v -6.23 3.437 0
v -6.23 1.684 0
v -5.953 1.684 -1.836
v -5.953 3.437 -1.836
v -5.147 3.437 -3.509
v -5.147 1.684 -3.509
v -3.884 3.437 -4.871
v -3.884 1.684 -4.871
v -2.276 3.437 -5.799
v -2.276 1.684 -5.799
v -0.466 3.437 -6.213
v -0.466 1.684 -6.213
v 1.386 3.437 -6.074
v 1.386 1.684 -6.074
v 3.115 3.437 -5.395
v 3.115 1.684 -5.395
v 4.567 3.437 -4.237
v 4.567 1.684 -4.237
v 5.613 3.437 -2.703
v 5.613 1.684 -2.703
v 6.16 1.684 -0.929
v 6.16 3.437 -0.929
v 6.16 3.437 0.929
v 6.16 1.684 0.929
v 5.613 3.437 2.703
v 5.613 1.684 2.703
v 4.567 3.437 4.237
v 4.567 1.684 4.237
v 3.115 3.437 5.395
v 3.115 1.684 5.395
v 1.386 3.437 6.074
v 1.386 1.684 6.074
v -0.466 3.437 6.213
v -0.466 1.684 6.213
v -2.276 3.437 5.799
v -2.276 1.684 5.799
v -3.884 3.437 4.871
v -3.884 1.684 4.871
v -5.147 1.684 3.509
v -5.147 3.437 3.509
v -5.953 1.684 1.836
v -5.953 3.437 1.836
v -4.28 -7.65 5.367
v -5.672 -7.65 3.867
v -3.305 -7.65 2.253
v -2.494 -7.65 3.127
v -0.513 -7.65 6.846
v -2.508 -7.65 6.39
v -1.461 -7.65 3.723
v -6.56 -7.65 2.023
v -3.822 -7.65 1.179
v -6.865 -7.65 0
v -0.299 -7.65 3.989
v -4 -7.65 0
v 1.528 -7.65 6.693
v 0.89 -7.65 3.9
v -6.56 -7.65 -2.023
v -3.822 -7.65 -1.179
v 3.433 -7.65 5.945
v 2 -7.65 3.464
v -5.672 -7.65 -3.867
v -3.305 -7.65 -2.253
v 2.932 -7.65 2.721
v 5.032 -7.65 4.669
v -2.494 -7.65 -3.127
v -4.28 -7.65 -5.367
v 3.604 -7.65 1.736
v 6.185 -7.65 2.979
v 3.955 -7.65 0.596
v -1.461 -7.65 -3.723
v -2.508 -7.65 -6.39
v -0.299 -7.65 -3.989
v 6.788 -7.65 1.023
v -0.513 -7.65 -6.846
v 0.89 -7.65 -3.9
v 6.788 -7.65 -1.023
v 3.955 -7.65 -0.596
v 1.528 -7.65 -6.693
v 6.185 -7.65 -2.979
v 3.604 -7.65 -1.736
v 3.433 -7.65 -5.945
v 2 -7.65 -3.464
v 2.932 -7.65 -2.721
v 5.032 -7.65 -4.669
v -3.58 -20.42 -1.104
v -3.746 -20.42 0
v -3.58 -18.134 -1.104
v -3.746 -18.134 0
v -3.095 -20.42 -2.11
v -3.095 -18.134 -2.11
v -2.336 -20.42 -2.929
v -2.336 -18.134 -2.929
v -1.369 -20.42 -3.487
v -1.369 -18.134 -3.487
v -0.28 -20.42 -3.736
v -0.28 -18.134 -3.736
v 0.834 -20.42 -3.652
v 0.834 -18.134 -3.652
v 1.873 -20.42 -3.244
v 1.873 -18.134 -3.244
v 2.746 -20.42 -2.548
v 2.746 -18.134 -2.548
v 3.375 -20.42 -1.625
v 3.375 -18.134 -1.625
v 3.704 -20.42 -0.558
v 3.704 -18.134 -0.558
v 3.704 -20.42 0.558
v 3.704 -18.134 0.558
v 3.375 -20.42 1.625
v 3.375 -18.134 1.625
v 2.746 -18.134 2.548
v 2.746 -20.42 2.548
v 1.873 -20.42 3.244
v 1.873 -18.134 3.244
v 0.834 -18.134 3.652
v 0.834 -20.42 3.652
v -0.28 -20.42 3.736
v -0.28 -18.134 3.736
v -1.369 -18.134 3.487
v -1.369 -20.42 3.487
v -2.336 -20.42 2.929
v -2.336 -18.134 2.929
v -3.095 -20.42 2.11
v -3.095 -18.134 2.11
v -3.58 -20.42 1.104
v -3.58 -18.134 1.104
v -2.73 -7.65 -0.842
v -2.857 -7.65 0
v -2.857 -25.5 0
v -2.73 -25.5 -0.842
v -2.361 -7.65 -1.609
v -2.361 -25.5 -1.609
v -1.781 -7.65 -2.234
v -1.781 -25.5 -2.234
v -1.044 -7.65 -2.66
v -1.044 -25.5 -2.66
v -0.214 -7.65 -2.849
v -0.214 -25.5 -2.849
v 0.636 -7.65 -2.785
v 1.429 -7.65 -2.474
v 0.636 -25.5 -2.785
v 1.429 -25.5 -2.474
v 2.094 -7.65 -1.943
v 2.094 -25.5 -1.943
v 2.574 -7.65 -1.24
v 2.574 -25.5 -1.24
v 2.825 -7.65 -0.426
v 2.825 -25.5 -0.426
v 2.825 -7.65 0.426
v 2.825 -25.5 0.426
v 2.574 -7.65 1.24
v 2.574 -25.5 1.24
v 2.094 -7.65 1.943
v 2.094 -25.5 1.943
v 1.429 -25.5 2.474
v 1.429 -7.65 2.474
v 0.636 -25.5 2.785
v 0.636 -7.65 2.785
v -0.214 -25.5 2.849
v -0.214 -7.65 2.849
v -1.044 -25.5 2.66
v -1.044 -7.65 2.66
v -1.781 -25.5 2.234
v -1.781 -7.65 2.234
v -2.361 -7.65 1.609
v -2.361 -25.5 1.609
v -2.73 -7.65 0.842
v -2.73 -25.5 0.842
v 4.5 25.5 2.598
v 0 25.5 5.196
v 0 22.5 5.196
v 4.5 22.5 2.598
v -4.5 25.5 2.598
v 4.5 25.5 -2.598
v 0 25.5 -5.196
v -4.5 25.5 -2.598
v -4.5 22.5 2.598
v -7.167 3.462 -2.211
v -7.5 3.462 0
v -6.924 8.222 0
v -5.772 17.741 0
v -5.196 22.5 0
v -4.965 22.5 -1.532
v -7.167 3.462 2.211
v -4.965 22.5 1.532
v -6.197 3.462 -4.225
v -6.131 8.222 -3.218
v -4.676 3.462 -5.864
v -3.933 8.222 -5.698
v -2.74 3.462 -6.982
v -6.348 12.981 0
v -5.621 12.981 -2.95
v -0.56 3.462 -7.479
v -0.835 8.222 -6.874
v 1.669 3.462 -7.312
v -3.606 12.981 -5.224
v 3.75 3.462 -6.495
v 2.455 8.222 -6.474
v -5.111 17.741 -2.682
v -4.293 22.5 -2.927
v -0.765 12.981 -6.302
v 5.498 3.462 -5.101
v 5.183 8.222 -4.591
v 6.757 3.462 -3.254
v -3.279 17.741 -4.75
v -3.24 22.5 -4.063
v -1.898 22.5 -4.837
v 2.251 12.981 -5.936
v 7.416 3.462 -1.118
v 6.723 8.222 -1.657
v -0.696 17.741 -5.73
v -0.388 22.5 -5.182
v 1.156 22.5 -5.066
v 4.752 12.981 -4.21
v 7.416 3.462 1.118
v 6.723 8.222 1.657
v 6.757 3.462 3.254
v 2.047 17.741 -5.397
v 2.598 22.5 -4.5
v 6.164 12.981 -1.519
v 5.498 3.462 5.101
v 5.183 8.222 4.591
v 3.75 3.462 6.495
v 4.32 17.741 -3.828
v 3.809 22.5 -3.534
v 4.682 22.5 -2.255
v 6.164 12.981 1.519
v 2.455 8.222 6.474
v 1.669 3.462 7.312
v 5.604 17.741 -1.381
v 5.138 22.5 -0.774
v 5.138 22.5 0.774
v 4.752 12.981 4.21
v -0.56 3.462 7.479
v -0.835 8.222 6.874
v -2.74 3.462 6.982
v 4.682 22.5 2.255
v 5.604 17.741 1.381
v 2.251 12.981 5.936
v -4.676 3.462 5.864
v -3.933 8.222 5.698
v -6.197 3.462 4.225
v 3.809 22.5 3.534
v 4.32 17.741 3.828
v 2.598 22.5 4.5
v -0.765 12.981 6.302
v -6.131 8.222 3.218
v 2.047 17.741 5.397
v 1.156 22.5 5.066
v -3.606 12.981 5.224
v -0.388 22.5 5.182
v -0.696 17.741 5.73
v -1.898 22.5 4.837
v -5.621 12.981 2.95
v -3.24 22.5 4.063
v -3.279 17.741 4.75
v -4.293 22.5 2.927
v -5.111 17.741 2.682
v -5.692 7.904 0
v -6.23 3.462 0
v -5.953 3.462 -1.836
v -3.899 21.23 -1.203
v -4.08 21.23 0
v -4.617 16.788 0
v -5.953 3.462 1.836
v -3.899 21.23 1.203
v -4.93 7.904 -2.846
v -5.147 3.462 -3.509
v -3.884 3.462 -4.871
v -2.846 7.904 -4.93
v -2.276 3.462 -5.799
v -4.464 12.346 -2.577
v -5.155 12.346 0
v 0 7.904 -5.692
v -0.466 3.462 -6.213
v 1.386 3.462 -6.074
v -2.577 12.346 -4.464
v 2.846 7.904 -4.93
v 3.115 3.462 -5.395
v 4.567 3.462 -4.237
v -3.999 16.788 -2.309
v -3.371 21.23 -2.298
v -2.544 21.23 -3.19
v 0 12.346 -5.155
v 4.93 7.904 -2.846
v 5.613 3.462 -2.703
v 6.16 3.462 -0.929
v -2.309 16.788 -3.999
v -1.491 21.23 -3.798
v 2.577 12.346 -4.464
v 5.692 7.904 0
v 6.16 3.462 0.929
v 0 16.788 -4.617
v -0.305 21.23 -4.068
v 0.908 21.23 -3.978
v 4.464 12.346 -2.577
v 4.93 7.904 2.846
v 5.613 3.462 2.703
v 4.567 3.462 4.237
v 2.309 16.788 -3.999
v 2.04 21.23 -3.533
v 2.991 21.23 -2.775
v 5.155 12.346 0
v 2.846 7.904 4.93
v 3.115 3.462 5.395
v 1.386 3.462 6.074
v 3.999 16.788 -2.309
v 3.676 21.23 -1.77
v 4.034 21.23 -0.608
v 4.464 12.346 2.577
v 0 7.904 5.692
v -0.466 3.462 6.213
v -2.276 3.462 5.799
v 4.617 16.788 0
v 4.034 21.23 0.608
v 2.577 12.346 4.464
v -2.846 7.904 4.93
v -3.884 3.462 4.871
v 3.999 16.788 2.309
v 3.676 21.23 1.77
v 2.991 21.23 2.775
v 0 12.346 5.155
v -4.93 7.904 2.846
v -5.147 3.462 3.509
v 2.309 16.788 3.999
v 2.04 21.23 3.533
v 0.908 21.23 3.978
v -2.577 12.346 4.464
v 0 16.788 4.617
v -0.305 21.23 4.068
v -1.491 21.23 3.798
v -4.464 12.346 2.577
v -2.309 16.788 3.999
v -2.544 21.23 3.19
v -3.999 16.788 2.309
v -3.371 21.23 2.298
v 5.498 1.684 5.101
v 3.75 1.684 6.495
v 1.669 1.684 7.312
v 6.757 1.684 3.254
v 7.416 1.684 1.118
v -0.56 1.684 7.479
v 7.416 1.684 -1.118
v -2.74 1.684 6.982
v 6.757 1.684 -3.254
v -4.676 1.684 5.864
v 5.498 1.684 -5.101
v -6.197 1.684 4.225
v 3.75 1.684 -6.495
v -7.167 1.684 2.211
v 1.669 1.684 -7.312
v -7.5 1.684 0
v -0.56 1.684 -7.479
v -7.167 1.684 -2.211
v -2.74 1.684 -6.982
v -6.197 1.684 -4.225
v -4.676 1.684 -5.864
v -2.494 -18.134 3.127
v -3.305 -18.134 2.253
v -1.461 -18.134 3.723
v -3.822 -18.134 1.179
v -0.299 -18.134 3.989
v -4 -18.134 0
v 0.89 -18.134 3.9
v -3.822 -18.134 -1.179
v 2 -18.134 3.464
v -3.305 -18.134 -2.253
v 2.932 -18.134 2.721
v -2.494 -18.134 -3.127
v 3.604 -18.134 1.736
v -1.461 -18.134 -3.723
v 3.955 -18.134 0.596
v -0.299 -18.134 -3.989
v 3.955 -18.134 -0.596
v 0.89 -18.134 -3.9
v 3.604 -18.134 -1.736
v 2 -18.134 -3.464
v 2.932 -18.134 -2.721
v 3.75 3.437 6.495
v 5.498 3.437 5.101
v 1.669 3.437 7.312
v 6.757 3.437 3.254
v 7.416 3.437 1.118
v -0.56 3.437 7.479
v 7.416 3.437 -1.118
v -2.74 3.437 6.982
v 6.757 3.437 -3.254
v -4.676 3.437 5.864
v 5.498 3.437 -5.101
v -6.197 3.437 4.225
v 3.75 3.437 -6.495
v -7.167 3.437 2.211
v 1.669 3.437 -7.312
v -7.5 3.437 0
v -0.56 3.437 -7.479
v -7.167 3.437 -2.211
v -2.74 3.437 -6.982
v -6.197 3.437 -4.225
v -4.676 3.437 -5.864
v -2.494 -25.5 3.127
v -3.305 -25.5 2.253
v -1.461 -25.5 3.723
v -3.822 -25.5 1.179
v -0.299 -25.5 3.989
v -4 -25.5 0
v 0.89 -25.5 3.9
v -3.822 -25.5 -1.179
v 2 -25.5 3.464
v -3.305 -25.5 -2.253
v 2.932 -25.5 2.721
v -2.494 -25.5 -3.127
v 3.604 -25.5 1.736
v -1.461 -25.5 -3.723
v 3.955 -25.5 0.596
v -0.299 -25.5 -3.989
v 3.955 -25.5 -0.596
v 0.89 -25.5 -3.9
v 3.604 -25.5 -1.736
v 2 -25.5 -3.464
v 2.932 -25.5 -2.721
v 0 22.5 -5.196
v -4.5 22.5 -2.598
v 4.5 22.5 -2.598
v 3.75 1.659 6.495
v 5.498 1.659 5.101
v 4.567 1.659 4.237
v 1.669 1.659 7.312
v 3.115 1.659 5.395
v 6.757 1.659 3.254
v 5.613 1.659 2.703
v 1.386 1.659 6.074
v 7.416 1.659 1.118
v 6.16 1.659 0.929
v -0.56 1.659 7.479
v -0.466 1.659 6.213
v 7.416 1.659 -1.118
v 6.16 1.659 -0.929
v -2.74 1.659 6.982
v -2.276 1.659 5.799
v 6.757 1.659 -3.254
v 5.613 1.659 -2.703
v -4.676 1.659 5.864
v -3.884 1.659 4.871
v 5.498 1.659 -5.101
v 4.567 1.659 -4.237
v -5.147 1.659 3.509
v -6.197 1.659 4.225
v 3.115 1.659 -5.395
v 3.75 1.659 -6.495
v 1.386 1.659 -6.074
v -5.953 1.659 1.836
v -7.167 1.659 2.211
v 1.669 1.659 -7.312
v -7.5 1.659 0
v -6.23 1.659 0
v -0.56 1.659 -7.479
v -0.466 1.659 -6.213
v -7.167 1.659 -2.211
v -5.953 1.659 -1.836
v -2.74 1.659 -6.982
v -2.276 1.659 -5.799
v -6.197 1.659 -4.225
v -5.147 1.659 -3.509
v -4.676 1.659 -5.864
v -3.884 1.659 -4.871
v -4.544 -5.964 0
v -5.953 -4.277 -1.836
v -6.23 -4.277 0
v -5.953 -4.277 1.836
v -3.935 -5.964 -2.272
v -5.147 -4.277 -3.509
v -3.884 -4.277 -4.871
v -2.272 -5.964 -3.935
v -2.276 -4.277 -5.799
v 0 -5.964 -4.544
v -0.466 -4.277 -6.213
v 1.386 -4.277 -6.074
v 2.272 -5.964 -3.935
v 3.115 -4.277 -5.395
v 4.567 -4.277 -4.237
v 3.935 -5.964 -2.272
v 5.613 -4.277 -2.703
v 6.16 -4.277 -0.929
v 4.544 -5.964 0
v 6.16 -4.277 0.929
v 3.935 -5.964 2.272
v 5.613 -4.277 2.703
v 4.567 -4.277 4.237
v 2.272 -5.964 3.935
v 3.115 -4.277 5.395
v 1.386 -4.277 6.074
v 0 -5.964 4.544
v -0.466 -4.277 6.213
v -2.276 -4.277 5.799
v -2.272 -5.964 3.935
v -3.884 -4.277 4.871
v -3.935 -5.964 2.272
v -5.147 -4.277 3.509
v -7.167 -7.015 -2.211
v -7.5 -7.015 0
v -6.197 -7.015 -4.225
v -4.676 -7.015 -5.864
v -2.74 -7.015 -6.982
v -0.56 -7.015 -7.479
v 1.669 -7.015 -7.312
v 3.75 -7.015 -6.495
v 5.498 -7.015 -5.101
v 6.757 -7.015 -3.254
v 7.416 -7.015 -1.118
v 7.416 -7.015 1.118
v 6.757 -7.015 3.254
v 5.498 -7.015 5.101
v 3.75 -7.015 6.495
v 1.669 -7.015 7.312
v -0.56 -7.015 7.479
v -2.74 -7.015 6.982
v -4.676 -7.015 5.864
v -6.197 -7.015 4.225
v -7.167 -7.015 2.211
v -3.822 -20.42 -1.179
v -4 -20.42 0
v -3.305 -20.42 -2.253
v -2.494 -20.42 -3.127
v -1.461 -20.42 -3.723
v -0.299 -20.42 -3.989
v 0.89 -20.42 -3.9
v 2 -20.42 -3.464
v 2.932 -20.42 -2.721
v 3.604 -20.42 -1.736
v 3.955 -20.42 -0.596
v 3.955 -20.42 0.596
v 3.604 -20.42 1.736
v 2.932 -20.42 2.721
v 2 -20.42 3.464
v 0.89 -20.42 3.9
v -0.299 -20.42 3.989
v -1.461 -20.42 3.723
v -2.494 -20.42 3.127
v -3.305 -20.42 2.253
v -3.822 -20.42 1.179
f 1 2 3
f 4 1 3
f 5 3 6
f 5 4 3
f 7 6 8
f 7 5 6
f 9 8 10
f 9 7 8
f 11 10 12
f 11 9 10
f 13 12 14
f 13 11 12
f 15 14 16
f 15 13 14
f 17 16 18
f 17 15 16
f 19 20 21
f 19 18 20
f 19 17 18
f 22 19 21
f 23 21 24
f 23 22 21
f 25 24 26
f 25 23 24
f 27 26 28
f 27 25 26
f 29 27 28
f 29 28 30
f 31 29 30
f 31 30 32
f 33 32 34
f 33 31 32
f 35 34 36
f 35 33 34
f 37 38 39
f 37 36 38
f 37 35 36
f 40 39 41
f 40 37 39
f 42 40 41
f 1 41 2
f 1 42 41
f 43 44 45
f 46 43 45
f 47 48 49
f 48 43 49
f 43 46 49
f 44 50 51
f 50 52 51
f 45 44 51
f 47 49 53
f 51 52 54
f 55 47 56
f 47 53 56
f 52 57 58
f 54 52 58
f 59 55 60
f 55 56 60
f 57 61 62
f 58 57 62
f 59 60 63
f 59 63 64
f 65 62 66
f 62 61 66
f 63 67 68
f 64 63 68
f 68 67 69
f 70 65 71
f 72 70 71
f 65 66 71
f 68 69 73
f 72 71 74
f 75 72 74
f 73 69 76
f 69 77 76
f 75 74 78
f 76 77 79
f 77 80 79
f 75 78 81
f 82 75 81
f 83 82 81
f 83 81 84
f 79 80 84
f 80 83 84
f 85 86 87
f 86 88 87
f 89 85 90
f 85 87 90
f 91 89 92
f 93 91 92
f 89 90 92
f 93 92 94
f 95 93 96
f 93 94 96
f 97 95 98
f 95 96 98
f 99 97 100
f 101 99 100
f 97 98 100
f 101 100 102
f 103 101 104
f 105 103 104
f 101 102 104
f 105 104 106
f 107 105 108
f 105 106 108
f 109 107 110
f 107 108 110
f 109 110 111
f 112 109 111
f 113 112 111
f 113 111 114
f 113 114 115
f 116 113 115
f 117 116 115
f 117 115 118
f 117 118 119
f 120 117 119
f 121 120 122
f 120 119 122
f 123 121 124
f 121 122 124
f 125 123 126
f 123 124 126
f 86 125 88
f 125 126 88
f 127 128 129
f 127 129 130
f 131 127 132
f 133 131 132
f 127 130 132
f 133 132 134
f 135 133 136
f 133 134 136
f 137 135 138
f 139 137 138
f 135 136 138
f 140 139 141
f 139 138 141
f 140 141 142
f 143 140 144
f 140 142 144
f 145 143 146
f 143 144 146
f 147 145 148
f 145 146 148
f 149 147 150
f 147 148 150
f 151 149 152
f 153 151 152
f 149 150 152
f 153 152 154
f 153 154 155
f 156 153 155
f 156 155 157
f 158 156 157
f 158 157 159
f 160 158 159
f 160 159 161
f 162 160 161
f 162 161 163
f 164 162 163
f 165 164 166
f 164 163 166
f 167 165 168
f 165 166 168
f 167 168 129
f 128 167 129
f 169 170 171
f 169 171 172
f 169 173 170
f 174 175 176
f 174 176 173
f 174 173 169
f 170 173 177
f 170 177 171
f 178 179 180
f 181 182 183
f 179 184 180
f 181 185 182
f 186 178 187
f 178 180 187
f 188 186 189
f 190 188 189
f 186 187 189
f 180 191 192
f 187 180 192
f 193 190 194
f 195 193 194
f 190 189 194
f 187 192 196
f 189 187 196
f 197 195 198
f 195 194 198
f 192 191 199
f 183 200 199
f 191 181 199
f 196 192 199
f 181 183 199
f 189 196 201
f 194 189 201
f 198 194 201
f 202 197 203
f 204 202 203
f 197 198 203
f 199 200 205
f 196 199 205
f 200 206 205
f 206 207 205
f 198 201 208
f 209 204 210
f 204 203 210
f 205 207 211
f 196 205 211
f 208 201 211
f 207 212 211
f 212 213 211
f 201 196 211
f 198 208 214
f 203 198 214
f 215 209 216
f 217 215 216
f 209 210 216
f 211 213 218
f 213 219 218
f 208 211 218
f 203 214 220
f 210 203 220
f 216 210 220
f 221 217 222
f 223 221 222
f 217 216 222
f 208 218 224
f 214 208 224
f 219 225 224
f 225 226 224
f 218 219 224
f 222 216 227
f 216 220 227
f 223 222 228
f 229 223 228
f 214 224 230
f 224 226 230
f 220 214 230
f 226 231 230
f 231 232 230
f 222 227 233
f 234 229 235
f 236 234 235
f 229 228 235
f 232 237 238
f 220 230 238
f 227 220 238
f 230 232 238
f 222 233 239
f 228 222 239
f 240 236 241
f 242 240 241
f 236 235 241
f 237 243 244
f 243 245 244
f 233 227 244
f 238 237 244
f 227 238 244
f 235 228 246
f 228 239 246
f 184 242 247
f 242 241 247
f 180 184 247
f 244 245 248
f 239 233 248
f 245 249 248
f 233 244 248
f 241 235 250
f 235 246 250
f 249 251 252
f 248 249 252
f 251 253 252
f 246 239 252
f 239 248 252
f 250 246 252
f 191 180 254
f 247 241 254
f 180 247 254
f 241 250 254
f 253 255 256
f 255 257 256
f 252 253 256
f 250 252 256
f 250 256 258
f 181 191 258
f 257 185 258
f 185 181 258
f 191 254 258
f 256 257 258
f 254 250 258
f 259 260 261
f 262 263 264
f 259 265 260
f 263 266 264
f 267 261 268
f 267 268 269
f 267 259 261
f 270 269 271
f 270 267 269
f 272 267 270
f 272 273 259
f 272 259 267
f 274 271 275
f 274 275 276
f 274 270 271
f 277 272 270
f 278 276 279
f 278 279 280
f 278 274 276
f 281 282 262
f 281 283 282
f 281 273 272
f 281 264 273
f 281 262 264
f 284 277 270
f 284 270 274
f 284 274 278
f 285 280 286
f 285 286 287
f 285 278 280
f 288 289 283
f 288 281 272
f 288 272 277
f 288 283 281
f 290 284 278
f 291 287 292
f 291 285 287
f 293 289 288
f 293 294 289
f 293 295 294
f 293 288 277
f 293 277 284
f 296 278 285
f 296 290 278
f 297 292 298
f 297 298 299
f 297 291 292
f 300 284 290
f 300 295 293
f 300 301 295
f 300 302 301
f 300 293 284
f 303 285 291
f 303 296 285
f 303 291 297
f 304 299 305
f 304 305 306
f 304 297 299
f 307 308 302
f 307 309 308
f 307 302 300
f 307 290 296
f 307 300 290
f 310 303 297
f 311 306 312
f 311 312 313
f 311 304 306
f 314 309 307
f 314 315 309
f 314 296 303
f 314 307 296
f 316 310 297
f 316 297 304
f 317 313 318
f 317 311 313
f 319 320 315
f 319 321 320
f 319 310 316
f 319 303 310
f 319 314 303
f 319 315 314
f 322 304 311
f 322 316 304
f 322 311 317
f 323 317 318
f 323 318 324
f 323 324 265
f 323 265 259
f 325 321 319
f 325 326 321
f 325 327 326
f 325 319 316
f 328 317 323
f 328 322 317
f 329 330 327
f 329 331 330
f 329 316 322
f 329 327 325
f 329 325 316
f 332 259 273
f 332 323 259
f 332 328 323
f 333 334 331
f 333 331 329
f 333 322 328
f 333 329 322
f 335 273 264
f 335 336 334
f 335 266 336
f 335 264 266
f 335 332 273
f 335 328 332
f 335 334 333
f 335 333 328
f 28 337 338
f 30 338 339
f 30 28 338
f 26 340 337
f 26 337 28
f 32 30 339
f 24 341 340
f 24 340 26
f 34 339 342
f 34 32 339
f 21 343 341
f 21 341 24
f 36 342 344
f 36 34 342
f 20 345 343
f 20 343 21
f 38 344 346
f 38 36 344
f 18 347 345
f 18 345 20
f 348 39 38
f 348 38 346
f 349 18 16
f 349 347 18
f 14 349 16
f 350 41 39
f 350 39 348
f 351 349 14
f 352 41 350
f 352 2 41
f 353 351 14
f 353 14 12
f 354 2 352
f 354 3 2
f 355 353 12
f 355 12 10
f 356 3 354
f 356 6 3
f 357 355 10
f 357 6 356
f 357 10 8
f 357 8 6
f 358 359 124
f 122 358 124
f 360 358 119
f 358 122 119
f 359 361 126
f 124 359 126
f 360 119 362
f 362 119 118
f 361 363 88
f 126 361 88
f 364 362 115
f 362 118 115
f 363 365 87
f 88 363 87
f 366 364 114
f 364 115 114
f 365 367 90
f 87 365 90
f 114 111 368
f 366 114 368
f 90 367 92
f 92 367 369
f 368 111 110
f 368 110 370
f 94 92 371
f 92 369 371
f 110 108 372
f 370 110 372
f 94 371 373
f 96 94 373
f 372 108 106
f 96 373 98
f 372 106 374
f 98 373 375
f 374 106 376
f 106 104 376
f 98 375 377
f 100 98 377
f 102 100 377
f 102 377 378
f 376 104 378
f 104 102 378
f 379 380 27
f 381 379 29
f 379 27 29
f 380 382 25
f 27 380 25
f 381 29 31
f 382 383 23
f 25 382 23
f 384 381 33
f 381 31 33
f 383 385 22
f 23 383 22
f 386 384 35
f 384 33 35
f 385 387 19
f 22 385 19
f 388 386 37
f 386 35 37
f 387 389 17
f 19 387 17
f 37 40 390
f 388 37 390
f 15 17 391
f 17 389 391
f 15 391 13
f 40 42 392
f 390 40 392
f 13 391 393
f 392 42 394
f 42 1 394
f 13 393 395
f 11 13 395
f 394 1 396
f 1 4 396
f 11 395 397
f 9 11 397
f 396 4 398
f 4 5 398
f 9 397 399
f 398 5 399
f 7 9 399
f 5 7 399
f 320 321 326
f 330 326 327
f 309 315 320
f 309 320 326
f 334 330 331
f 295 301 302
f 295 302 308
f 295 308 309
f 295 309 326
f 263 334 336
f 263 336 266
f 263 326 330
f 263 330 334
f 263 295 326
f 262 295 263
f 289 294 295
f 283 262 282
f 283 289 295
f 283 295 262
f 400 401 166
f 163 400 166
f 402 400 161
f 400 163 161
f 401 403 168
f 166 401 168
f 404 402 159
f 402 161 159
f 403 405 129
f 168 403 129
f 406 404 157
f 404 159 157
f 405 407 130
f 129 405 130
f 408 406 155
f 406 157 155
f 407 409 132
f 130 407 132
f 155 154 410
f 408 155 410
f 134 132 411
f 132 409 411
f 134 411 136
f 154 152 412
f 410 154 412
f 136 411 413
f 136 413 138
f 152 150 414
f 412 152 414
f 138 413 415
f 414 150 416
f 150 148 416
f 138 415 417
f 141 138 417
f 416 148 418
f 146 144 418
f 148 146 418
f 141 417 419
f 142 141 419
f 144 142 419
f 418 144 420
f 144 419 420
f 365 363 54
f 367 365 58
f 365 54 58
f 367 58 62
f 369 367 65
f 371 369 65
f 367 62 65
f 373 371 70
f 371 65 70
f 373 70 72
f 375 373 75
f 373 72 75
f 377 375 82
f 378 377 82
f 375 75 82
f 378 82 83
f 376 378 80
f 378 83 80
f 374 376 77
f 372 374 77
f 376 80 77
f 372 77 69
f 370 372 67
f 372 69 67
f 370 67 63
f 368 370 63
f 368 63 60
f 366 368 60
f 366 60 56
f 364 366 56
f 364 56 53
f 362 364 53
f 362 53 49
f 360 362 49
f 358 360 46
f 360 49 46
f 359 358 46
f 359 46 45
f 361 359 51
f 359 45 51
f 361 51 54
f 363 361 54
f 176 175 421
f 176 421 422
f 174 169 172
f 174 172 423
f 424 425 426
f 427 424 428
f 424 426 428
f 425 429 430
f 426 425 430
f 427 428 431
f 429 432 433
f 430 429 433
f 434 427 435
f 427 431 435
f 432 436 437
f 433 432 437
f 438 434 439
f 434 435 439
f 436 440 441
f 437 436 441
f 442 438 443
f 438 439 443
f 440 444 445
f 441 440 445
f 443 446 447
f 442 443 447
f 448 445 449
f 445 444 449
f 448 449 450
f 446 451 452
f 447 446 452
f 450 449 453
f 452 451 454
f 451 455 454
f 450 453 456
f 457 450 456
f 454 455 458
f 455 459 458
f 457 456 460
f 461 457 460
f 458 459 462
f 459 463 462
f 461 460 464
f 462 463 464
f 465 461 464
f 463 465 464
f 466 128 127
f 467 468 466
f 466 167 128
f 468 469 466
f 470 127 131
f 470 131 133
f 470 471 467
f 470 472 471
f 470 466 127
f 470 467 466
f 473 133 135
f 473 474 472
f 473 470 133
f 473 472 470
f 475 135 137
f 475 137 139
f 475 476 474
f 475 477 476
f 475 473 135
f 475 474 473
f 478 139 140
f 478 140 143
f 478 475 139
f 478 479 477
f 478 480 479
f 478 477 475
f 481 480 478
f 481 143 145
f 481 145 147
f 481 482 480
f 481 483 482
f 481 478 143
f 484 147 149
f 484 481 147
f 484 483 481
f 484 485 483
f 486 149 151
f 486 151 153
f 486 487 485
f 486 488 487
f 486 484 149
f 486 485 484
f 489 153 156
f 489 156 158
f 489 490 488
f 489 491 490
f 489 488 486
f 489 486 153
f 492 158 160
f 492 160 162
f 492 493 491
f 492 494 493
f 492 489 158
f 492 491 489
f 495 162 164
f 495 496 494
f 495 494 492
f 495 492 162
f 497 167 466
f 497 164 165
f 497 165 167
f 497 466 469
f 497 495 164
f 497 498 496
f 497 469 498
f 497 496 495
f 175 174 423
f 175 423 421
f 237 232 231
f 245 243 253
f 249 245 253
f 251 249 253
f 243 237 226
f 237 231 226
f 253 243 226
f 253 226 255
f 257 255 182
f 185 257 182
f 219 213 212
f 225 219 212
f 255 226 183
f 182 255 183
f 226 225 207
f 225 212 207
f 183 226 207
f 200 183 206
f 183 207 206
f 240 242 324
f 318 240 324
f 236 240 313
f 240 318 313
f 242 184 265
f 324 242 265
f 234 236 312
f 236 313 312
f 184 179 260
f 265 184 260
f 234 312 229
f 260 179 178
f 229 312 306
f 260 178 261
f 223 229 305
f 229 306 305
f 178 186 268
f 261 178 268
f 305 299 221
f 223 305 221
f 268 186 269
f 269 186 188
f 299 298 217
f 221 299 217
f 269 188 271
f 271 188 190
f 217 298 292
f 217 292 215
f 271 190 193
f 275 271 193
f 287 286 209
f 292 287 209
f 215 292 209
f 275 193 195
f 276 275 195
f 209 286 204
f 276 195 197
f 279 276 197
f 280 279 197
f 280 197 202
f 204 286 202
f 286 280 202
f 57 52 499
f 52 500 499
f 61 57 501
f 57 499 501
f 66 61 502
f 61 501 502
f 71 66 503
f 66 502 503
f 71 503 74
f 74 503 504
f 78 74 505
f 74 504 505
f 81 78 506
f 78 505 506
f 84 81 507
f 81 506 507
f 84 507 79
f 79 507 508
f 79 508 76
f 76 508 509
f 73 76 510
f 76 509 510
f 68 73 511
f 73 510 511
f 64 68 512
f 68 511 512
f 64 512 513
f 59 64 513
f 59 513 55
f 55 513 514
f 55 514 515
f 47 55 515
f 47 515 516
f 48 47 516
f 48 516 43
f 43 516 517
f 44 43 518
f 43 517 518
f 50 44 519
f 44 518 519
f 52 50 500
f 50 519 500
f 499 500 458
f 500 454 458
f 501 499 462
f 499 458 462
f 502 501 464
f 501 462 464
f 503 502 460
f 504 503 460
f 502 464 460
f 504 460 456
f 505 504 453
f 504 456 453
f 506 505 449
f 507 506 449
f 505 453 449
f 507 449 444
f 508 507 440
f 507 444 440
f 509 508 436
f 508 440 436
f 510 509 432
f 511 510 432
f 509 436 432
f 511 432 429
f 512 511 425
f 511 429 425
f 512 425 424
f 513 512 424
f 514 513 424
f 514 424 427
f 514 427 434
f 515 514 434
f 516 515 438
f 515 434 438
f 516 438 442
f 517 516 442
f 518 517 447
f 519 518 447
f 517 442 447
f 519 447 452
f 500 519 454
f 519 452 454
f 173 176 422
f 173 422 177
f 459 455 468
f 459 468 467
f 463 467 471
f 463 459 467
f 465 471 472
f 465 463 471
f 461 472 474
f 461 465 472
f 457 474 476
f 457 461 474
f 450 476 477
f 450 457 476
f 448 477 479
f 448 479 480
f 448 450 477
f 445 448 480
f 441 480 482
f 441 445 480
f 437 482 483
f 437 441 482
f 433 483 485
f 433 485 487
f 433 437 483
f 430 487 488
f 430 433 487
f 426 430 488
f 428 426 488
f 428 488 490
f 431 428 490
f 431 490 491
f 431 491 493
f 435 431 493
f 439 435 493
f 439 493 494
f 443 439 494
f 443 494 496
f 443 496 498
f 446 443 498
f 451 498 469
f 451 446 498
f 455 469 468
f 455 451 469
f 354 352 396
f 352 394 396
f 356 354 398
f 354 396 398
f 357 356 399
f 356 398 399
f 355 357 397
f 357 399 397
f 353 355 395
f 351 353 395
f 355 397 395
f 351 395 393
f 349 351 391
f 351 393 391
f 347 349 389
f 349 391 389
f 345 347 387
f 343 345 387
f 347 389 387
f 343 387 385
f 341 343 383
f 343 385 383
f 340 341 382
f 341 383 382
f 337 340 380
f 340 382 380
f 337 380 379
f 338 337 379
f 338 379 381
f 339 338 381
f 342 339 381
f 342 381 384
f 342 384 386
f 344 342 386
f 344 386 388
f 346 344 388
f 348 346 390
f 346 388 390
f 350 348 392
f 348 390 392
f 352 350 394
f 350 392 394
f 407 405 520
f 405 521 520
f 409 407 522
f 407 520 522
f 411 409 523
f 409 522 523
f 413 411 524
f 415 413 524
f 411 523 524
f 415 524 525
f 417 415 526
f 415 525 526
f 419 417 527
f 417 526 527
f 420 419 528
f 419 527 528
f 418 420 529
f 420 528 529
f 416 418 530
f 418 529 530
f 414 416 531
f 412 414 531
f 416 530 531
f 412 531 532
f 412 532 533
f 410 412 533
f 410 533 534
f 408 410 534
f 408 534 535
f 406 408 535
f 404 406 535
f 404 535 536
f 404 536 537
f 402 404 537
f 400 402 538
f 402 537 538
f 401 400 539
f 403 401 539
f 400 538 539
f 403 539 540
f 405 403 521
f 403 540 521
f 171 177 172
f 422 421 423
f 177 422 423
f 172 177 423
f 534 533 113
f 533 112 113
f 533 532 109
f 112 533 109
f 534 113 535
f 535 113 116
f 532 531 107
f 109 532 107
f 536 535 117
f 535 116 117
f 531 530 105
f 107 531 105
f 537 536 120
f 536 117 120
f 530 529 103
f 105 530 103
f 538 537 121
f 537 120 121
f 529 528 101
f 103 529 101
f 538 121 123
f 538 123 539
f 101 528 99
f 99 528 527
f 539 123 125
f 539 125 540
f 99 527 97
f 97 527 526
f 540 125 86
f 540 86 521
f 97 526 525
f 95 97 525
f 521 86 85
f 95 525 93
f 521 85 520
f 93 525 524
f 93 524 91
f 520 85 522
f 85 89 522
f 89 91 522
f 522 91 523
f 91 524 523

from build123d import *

# Parameters (mm, degrees)
SKETCH5_W           = 7.5
SKETCH5_H           = 1.7526
BOSS_EXTRUDE1_START = 25.5
BOSS_EXTRUDE1_DEPTH = 3


with BuildPart() as part:
    # Sketch5 → Revolve1 (revolve)
    with BuildSketch(Plane.XY):
        Polygon((-4, -25.5), (-4, -20.42), (-3.746, -20.42), (-3.746, -18.134), (-4, -18.134), (-4, -7.65), (-6.865, -7.65), (-7.5, -7.015), (-7.5, 1.6591), (0, 1.6591), (0, -7.65), (-2.857, -7.65), (-2.857, -25.5), align=None)
        Polygon((-7.5, 3.4625), (-5.196152423, 22.5), (0, 22.5), (0, 3.4625), align=None)
        with Locations((-3.75, 2.5608)):
            Rectangle(SKETCH5_W, SKETCH5_H)
    revolve(axis=Axis((0, 22.5, 0), (0, -1, 0)))

    # Sketch6 → Cut-Revolve1 (revolve, cut)
    with BuildSketch(Plane.XY):
        Polygon((-2.857, -7.65), (-6.23, -4.277), (-6.23, 3.4625), (-4.079843108, 21.23), (0, 21.23), (0, -7.65), align=None)
    revolve(axis=Axis((0, 21.23, 0), (0, -1, 0)), mode=Mode.SUBTRACT)


with BuildPart() as body_2:
    # Sketch3 → Boss-Extrude1 (new body)
    with BuildSketch(Plane(origin=(0, 0, 0), x_dir=(1, 0, 0), z_dir=(0, 1, 0)).offset(BOSS_EXTRUDE1_START)):
        Polygon((0, 5.196152423), (-4.5, 2.598076211), (-4.5, -2.598076211), (0, -5.196152423), (4.5, -2.598076211), (4.5, 2.598076211), align=None)
    extrude(amount=-BOSS_EXTRUDE1_DEPTH)


solid = Compound([part.part, body_2.part])
